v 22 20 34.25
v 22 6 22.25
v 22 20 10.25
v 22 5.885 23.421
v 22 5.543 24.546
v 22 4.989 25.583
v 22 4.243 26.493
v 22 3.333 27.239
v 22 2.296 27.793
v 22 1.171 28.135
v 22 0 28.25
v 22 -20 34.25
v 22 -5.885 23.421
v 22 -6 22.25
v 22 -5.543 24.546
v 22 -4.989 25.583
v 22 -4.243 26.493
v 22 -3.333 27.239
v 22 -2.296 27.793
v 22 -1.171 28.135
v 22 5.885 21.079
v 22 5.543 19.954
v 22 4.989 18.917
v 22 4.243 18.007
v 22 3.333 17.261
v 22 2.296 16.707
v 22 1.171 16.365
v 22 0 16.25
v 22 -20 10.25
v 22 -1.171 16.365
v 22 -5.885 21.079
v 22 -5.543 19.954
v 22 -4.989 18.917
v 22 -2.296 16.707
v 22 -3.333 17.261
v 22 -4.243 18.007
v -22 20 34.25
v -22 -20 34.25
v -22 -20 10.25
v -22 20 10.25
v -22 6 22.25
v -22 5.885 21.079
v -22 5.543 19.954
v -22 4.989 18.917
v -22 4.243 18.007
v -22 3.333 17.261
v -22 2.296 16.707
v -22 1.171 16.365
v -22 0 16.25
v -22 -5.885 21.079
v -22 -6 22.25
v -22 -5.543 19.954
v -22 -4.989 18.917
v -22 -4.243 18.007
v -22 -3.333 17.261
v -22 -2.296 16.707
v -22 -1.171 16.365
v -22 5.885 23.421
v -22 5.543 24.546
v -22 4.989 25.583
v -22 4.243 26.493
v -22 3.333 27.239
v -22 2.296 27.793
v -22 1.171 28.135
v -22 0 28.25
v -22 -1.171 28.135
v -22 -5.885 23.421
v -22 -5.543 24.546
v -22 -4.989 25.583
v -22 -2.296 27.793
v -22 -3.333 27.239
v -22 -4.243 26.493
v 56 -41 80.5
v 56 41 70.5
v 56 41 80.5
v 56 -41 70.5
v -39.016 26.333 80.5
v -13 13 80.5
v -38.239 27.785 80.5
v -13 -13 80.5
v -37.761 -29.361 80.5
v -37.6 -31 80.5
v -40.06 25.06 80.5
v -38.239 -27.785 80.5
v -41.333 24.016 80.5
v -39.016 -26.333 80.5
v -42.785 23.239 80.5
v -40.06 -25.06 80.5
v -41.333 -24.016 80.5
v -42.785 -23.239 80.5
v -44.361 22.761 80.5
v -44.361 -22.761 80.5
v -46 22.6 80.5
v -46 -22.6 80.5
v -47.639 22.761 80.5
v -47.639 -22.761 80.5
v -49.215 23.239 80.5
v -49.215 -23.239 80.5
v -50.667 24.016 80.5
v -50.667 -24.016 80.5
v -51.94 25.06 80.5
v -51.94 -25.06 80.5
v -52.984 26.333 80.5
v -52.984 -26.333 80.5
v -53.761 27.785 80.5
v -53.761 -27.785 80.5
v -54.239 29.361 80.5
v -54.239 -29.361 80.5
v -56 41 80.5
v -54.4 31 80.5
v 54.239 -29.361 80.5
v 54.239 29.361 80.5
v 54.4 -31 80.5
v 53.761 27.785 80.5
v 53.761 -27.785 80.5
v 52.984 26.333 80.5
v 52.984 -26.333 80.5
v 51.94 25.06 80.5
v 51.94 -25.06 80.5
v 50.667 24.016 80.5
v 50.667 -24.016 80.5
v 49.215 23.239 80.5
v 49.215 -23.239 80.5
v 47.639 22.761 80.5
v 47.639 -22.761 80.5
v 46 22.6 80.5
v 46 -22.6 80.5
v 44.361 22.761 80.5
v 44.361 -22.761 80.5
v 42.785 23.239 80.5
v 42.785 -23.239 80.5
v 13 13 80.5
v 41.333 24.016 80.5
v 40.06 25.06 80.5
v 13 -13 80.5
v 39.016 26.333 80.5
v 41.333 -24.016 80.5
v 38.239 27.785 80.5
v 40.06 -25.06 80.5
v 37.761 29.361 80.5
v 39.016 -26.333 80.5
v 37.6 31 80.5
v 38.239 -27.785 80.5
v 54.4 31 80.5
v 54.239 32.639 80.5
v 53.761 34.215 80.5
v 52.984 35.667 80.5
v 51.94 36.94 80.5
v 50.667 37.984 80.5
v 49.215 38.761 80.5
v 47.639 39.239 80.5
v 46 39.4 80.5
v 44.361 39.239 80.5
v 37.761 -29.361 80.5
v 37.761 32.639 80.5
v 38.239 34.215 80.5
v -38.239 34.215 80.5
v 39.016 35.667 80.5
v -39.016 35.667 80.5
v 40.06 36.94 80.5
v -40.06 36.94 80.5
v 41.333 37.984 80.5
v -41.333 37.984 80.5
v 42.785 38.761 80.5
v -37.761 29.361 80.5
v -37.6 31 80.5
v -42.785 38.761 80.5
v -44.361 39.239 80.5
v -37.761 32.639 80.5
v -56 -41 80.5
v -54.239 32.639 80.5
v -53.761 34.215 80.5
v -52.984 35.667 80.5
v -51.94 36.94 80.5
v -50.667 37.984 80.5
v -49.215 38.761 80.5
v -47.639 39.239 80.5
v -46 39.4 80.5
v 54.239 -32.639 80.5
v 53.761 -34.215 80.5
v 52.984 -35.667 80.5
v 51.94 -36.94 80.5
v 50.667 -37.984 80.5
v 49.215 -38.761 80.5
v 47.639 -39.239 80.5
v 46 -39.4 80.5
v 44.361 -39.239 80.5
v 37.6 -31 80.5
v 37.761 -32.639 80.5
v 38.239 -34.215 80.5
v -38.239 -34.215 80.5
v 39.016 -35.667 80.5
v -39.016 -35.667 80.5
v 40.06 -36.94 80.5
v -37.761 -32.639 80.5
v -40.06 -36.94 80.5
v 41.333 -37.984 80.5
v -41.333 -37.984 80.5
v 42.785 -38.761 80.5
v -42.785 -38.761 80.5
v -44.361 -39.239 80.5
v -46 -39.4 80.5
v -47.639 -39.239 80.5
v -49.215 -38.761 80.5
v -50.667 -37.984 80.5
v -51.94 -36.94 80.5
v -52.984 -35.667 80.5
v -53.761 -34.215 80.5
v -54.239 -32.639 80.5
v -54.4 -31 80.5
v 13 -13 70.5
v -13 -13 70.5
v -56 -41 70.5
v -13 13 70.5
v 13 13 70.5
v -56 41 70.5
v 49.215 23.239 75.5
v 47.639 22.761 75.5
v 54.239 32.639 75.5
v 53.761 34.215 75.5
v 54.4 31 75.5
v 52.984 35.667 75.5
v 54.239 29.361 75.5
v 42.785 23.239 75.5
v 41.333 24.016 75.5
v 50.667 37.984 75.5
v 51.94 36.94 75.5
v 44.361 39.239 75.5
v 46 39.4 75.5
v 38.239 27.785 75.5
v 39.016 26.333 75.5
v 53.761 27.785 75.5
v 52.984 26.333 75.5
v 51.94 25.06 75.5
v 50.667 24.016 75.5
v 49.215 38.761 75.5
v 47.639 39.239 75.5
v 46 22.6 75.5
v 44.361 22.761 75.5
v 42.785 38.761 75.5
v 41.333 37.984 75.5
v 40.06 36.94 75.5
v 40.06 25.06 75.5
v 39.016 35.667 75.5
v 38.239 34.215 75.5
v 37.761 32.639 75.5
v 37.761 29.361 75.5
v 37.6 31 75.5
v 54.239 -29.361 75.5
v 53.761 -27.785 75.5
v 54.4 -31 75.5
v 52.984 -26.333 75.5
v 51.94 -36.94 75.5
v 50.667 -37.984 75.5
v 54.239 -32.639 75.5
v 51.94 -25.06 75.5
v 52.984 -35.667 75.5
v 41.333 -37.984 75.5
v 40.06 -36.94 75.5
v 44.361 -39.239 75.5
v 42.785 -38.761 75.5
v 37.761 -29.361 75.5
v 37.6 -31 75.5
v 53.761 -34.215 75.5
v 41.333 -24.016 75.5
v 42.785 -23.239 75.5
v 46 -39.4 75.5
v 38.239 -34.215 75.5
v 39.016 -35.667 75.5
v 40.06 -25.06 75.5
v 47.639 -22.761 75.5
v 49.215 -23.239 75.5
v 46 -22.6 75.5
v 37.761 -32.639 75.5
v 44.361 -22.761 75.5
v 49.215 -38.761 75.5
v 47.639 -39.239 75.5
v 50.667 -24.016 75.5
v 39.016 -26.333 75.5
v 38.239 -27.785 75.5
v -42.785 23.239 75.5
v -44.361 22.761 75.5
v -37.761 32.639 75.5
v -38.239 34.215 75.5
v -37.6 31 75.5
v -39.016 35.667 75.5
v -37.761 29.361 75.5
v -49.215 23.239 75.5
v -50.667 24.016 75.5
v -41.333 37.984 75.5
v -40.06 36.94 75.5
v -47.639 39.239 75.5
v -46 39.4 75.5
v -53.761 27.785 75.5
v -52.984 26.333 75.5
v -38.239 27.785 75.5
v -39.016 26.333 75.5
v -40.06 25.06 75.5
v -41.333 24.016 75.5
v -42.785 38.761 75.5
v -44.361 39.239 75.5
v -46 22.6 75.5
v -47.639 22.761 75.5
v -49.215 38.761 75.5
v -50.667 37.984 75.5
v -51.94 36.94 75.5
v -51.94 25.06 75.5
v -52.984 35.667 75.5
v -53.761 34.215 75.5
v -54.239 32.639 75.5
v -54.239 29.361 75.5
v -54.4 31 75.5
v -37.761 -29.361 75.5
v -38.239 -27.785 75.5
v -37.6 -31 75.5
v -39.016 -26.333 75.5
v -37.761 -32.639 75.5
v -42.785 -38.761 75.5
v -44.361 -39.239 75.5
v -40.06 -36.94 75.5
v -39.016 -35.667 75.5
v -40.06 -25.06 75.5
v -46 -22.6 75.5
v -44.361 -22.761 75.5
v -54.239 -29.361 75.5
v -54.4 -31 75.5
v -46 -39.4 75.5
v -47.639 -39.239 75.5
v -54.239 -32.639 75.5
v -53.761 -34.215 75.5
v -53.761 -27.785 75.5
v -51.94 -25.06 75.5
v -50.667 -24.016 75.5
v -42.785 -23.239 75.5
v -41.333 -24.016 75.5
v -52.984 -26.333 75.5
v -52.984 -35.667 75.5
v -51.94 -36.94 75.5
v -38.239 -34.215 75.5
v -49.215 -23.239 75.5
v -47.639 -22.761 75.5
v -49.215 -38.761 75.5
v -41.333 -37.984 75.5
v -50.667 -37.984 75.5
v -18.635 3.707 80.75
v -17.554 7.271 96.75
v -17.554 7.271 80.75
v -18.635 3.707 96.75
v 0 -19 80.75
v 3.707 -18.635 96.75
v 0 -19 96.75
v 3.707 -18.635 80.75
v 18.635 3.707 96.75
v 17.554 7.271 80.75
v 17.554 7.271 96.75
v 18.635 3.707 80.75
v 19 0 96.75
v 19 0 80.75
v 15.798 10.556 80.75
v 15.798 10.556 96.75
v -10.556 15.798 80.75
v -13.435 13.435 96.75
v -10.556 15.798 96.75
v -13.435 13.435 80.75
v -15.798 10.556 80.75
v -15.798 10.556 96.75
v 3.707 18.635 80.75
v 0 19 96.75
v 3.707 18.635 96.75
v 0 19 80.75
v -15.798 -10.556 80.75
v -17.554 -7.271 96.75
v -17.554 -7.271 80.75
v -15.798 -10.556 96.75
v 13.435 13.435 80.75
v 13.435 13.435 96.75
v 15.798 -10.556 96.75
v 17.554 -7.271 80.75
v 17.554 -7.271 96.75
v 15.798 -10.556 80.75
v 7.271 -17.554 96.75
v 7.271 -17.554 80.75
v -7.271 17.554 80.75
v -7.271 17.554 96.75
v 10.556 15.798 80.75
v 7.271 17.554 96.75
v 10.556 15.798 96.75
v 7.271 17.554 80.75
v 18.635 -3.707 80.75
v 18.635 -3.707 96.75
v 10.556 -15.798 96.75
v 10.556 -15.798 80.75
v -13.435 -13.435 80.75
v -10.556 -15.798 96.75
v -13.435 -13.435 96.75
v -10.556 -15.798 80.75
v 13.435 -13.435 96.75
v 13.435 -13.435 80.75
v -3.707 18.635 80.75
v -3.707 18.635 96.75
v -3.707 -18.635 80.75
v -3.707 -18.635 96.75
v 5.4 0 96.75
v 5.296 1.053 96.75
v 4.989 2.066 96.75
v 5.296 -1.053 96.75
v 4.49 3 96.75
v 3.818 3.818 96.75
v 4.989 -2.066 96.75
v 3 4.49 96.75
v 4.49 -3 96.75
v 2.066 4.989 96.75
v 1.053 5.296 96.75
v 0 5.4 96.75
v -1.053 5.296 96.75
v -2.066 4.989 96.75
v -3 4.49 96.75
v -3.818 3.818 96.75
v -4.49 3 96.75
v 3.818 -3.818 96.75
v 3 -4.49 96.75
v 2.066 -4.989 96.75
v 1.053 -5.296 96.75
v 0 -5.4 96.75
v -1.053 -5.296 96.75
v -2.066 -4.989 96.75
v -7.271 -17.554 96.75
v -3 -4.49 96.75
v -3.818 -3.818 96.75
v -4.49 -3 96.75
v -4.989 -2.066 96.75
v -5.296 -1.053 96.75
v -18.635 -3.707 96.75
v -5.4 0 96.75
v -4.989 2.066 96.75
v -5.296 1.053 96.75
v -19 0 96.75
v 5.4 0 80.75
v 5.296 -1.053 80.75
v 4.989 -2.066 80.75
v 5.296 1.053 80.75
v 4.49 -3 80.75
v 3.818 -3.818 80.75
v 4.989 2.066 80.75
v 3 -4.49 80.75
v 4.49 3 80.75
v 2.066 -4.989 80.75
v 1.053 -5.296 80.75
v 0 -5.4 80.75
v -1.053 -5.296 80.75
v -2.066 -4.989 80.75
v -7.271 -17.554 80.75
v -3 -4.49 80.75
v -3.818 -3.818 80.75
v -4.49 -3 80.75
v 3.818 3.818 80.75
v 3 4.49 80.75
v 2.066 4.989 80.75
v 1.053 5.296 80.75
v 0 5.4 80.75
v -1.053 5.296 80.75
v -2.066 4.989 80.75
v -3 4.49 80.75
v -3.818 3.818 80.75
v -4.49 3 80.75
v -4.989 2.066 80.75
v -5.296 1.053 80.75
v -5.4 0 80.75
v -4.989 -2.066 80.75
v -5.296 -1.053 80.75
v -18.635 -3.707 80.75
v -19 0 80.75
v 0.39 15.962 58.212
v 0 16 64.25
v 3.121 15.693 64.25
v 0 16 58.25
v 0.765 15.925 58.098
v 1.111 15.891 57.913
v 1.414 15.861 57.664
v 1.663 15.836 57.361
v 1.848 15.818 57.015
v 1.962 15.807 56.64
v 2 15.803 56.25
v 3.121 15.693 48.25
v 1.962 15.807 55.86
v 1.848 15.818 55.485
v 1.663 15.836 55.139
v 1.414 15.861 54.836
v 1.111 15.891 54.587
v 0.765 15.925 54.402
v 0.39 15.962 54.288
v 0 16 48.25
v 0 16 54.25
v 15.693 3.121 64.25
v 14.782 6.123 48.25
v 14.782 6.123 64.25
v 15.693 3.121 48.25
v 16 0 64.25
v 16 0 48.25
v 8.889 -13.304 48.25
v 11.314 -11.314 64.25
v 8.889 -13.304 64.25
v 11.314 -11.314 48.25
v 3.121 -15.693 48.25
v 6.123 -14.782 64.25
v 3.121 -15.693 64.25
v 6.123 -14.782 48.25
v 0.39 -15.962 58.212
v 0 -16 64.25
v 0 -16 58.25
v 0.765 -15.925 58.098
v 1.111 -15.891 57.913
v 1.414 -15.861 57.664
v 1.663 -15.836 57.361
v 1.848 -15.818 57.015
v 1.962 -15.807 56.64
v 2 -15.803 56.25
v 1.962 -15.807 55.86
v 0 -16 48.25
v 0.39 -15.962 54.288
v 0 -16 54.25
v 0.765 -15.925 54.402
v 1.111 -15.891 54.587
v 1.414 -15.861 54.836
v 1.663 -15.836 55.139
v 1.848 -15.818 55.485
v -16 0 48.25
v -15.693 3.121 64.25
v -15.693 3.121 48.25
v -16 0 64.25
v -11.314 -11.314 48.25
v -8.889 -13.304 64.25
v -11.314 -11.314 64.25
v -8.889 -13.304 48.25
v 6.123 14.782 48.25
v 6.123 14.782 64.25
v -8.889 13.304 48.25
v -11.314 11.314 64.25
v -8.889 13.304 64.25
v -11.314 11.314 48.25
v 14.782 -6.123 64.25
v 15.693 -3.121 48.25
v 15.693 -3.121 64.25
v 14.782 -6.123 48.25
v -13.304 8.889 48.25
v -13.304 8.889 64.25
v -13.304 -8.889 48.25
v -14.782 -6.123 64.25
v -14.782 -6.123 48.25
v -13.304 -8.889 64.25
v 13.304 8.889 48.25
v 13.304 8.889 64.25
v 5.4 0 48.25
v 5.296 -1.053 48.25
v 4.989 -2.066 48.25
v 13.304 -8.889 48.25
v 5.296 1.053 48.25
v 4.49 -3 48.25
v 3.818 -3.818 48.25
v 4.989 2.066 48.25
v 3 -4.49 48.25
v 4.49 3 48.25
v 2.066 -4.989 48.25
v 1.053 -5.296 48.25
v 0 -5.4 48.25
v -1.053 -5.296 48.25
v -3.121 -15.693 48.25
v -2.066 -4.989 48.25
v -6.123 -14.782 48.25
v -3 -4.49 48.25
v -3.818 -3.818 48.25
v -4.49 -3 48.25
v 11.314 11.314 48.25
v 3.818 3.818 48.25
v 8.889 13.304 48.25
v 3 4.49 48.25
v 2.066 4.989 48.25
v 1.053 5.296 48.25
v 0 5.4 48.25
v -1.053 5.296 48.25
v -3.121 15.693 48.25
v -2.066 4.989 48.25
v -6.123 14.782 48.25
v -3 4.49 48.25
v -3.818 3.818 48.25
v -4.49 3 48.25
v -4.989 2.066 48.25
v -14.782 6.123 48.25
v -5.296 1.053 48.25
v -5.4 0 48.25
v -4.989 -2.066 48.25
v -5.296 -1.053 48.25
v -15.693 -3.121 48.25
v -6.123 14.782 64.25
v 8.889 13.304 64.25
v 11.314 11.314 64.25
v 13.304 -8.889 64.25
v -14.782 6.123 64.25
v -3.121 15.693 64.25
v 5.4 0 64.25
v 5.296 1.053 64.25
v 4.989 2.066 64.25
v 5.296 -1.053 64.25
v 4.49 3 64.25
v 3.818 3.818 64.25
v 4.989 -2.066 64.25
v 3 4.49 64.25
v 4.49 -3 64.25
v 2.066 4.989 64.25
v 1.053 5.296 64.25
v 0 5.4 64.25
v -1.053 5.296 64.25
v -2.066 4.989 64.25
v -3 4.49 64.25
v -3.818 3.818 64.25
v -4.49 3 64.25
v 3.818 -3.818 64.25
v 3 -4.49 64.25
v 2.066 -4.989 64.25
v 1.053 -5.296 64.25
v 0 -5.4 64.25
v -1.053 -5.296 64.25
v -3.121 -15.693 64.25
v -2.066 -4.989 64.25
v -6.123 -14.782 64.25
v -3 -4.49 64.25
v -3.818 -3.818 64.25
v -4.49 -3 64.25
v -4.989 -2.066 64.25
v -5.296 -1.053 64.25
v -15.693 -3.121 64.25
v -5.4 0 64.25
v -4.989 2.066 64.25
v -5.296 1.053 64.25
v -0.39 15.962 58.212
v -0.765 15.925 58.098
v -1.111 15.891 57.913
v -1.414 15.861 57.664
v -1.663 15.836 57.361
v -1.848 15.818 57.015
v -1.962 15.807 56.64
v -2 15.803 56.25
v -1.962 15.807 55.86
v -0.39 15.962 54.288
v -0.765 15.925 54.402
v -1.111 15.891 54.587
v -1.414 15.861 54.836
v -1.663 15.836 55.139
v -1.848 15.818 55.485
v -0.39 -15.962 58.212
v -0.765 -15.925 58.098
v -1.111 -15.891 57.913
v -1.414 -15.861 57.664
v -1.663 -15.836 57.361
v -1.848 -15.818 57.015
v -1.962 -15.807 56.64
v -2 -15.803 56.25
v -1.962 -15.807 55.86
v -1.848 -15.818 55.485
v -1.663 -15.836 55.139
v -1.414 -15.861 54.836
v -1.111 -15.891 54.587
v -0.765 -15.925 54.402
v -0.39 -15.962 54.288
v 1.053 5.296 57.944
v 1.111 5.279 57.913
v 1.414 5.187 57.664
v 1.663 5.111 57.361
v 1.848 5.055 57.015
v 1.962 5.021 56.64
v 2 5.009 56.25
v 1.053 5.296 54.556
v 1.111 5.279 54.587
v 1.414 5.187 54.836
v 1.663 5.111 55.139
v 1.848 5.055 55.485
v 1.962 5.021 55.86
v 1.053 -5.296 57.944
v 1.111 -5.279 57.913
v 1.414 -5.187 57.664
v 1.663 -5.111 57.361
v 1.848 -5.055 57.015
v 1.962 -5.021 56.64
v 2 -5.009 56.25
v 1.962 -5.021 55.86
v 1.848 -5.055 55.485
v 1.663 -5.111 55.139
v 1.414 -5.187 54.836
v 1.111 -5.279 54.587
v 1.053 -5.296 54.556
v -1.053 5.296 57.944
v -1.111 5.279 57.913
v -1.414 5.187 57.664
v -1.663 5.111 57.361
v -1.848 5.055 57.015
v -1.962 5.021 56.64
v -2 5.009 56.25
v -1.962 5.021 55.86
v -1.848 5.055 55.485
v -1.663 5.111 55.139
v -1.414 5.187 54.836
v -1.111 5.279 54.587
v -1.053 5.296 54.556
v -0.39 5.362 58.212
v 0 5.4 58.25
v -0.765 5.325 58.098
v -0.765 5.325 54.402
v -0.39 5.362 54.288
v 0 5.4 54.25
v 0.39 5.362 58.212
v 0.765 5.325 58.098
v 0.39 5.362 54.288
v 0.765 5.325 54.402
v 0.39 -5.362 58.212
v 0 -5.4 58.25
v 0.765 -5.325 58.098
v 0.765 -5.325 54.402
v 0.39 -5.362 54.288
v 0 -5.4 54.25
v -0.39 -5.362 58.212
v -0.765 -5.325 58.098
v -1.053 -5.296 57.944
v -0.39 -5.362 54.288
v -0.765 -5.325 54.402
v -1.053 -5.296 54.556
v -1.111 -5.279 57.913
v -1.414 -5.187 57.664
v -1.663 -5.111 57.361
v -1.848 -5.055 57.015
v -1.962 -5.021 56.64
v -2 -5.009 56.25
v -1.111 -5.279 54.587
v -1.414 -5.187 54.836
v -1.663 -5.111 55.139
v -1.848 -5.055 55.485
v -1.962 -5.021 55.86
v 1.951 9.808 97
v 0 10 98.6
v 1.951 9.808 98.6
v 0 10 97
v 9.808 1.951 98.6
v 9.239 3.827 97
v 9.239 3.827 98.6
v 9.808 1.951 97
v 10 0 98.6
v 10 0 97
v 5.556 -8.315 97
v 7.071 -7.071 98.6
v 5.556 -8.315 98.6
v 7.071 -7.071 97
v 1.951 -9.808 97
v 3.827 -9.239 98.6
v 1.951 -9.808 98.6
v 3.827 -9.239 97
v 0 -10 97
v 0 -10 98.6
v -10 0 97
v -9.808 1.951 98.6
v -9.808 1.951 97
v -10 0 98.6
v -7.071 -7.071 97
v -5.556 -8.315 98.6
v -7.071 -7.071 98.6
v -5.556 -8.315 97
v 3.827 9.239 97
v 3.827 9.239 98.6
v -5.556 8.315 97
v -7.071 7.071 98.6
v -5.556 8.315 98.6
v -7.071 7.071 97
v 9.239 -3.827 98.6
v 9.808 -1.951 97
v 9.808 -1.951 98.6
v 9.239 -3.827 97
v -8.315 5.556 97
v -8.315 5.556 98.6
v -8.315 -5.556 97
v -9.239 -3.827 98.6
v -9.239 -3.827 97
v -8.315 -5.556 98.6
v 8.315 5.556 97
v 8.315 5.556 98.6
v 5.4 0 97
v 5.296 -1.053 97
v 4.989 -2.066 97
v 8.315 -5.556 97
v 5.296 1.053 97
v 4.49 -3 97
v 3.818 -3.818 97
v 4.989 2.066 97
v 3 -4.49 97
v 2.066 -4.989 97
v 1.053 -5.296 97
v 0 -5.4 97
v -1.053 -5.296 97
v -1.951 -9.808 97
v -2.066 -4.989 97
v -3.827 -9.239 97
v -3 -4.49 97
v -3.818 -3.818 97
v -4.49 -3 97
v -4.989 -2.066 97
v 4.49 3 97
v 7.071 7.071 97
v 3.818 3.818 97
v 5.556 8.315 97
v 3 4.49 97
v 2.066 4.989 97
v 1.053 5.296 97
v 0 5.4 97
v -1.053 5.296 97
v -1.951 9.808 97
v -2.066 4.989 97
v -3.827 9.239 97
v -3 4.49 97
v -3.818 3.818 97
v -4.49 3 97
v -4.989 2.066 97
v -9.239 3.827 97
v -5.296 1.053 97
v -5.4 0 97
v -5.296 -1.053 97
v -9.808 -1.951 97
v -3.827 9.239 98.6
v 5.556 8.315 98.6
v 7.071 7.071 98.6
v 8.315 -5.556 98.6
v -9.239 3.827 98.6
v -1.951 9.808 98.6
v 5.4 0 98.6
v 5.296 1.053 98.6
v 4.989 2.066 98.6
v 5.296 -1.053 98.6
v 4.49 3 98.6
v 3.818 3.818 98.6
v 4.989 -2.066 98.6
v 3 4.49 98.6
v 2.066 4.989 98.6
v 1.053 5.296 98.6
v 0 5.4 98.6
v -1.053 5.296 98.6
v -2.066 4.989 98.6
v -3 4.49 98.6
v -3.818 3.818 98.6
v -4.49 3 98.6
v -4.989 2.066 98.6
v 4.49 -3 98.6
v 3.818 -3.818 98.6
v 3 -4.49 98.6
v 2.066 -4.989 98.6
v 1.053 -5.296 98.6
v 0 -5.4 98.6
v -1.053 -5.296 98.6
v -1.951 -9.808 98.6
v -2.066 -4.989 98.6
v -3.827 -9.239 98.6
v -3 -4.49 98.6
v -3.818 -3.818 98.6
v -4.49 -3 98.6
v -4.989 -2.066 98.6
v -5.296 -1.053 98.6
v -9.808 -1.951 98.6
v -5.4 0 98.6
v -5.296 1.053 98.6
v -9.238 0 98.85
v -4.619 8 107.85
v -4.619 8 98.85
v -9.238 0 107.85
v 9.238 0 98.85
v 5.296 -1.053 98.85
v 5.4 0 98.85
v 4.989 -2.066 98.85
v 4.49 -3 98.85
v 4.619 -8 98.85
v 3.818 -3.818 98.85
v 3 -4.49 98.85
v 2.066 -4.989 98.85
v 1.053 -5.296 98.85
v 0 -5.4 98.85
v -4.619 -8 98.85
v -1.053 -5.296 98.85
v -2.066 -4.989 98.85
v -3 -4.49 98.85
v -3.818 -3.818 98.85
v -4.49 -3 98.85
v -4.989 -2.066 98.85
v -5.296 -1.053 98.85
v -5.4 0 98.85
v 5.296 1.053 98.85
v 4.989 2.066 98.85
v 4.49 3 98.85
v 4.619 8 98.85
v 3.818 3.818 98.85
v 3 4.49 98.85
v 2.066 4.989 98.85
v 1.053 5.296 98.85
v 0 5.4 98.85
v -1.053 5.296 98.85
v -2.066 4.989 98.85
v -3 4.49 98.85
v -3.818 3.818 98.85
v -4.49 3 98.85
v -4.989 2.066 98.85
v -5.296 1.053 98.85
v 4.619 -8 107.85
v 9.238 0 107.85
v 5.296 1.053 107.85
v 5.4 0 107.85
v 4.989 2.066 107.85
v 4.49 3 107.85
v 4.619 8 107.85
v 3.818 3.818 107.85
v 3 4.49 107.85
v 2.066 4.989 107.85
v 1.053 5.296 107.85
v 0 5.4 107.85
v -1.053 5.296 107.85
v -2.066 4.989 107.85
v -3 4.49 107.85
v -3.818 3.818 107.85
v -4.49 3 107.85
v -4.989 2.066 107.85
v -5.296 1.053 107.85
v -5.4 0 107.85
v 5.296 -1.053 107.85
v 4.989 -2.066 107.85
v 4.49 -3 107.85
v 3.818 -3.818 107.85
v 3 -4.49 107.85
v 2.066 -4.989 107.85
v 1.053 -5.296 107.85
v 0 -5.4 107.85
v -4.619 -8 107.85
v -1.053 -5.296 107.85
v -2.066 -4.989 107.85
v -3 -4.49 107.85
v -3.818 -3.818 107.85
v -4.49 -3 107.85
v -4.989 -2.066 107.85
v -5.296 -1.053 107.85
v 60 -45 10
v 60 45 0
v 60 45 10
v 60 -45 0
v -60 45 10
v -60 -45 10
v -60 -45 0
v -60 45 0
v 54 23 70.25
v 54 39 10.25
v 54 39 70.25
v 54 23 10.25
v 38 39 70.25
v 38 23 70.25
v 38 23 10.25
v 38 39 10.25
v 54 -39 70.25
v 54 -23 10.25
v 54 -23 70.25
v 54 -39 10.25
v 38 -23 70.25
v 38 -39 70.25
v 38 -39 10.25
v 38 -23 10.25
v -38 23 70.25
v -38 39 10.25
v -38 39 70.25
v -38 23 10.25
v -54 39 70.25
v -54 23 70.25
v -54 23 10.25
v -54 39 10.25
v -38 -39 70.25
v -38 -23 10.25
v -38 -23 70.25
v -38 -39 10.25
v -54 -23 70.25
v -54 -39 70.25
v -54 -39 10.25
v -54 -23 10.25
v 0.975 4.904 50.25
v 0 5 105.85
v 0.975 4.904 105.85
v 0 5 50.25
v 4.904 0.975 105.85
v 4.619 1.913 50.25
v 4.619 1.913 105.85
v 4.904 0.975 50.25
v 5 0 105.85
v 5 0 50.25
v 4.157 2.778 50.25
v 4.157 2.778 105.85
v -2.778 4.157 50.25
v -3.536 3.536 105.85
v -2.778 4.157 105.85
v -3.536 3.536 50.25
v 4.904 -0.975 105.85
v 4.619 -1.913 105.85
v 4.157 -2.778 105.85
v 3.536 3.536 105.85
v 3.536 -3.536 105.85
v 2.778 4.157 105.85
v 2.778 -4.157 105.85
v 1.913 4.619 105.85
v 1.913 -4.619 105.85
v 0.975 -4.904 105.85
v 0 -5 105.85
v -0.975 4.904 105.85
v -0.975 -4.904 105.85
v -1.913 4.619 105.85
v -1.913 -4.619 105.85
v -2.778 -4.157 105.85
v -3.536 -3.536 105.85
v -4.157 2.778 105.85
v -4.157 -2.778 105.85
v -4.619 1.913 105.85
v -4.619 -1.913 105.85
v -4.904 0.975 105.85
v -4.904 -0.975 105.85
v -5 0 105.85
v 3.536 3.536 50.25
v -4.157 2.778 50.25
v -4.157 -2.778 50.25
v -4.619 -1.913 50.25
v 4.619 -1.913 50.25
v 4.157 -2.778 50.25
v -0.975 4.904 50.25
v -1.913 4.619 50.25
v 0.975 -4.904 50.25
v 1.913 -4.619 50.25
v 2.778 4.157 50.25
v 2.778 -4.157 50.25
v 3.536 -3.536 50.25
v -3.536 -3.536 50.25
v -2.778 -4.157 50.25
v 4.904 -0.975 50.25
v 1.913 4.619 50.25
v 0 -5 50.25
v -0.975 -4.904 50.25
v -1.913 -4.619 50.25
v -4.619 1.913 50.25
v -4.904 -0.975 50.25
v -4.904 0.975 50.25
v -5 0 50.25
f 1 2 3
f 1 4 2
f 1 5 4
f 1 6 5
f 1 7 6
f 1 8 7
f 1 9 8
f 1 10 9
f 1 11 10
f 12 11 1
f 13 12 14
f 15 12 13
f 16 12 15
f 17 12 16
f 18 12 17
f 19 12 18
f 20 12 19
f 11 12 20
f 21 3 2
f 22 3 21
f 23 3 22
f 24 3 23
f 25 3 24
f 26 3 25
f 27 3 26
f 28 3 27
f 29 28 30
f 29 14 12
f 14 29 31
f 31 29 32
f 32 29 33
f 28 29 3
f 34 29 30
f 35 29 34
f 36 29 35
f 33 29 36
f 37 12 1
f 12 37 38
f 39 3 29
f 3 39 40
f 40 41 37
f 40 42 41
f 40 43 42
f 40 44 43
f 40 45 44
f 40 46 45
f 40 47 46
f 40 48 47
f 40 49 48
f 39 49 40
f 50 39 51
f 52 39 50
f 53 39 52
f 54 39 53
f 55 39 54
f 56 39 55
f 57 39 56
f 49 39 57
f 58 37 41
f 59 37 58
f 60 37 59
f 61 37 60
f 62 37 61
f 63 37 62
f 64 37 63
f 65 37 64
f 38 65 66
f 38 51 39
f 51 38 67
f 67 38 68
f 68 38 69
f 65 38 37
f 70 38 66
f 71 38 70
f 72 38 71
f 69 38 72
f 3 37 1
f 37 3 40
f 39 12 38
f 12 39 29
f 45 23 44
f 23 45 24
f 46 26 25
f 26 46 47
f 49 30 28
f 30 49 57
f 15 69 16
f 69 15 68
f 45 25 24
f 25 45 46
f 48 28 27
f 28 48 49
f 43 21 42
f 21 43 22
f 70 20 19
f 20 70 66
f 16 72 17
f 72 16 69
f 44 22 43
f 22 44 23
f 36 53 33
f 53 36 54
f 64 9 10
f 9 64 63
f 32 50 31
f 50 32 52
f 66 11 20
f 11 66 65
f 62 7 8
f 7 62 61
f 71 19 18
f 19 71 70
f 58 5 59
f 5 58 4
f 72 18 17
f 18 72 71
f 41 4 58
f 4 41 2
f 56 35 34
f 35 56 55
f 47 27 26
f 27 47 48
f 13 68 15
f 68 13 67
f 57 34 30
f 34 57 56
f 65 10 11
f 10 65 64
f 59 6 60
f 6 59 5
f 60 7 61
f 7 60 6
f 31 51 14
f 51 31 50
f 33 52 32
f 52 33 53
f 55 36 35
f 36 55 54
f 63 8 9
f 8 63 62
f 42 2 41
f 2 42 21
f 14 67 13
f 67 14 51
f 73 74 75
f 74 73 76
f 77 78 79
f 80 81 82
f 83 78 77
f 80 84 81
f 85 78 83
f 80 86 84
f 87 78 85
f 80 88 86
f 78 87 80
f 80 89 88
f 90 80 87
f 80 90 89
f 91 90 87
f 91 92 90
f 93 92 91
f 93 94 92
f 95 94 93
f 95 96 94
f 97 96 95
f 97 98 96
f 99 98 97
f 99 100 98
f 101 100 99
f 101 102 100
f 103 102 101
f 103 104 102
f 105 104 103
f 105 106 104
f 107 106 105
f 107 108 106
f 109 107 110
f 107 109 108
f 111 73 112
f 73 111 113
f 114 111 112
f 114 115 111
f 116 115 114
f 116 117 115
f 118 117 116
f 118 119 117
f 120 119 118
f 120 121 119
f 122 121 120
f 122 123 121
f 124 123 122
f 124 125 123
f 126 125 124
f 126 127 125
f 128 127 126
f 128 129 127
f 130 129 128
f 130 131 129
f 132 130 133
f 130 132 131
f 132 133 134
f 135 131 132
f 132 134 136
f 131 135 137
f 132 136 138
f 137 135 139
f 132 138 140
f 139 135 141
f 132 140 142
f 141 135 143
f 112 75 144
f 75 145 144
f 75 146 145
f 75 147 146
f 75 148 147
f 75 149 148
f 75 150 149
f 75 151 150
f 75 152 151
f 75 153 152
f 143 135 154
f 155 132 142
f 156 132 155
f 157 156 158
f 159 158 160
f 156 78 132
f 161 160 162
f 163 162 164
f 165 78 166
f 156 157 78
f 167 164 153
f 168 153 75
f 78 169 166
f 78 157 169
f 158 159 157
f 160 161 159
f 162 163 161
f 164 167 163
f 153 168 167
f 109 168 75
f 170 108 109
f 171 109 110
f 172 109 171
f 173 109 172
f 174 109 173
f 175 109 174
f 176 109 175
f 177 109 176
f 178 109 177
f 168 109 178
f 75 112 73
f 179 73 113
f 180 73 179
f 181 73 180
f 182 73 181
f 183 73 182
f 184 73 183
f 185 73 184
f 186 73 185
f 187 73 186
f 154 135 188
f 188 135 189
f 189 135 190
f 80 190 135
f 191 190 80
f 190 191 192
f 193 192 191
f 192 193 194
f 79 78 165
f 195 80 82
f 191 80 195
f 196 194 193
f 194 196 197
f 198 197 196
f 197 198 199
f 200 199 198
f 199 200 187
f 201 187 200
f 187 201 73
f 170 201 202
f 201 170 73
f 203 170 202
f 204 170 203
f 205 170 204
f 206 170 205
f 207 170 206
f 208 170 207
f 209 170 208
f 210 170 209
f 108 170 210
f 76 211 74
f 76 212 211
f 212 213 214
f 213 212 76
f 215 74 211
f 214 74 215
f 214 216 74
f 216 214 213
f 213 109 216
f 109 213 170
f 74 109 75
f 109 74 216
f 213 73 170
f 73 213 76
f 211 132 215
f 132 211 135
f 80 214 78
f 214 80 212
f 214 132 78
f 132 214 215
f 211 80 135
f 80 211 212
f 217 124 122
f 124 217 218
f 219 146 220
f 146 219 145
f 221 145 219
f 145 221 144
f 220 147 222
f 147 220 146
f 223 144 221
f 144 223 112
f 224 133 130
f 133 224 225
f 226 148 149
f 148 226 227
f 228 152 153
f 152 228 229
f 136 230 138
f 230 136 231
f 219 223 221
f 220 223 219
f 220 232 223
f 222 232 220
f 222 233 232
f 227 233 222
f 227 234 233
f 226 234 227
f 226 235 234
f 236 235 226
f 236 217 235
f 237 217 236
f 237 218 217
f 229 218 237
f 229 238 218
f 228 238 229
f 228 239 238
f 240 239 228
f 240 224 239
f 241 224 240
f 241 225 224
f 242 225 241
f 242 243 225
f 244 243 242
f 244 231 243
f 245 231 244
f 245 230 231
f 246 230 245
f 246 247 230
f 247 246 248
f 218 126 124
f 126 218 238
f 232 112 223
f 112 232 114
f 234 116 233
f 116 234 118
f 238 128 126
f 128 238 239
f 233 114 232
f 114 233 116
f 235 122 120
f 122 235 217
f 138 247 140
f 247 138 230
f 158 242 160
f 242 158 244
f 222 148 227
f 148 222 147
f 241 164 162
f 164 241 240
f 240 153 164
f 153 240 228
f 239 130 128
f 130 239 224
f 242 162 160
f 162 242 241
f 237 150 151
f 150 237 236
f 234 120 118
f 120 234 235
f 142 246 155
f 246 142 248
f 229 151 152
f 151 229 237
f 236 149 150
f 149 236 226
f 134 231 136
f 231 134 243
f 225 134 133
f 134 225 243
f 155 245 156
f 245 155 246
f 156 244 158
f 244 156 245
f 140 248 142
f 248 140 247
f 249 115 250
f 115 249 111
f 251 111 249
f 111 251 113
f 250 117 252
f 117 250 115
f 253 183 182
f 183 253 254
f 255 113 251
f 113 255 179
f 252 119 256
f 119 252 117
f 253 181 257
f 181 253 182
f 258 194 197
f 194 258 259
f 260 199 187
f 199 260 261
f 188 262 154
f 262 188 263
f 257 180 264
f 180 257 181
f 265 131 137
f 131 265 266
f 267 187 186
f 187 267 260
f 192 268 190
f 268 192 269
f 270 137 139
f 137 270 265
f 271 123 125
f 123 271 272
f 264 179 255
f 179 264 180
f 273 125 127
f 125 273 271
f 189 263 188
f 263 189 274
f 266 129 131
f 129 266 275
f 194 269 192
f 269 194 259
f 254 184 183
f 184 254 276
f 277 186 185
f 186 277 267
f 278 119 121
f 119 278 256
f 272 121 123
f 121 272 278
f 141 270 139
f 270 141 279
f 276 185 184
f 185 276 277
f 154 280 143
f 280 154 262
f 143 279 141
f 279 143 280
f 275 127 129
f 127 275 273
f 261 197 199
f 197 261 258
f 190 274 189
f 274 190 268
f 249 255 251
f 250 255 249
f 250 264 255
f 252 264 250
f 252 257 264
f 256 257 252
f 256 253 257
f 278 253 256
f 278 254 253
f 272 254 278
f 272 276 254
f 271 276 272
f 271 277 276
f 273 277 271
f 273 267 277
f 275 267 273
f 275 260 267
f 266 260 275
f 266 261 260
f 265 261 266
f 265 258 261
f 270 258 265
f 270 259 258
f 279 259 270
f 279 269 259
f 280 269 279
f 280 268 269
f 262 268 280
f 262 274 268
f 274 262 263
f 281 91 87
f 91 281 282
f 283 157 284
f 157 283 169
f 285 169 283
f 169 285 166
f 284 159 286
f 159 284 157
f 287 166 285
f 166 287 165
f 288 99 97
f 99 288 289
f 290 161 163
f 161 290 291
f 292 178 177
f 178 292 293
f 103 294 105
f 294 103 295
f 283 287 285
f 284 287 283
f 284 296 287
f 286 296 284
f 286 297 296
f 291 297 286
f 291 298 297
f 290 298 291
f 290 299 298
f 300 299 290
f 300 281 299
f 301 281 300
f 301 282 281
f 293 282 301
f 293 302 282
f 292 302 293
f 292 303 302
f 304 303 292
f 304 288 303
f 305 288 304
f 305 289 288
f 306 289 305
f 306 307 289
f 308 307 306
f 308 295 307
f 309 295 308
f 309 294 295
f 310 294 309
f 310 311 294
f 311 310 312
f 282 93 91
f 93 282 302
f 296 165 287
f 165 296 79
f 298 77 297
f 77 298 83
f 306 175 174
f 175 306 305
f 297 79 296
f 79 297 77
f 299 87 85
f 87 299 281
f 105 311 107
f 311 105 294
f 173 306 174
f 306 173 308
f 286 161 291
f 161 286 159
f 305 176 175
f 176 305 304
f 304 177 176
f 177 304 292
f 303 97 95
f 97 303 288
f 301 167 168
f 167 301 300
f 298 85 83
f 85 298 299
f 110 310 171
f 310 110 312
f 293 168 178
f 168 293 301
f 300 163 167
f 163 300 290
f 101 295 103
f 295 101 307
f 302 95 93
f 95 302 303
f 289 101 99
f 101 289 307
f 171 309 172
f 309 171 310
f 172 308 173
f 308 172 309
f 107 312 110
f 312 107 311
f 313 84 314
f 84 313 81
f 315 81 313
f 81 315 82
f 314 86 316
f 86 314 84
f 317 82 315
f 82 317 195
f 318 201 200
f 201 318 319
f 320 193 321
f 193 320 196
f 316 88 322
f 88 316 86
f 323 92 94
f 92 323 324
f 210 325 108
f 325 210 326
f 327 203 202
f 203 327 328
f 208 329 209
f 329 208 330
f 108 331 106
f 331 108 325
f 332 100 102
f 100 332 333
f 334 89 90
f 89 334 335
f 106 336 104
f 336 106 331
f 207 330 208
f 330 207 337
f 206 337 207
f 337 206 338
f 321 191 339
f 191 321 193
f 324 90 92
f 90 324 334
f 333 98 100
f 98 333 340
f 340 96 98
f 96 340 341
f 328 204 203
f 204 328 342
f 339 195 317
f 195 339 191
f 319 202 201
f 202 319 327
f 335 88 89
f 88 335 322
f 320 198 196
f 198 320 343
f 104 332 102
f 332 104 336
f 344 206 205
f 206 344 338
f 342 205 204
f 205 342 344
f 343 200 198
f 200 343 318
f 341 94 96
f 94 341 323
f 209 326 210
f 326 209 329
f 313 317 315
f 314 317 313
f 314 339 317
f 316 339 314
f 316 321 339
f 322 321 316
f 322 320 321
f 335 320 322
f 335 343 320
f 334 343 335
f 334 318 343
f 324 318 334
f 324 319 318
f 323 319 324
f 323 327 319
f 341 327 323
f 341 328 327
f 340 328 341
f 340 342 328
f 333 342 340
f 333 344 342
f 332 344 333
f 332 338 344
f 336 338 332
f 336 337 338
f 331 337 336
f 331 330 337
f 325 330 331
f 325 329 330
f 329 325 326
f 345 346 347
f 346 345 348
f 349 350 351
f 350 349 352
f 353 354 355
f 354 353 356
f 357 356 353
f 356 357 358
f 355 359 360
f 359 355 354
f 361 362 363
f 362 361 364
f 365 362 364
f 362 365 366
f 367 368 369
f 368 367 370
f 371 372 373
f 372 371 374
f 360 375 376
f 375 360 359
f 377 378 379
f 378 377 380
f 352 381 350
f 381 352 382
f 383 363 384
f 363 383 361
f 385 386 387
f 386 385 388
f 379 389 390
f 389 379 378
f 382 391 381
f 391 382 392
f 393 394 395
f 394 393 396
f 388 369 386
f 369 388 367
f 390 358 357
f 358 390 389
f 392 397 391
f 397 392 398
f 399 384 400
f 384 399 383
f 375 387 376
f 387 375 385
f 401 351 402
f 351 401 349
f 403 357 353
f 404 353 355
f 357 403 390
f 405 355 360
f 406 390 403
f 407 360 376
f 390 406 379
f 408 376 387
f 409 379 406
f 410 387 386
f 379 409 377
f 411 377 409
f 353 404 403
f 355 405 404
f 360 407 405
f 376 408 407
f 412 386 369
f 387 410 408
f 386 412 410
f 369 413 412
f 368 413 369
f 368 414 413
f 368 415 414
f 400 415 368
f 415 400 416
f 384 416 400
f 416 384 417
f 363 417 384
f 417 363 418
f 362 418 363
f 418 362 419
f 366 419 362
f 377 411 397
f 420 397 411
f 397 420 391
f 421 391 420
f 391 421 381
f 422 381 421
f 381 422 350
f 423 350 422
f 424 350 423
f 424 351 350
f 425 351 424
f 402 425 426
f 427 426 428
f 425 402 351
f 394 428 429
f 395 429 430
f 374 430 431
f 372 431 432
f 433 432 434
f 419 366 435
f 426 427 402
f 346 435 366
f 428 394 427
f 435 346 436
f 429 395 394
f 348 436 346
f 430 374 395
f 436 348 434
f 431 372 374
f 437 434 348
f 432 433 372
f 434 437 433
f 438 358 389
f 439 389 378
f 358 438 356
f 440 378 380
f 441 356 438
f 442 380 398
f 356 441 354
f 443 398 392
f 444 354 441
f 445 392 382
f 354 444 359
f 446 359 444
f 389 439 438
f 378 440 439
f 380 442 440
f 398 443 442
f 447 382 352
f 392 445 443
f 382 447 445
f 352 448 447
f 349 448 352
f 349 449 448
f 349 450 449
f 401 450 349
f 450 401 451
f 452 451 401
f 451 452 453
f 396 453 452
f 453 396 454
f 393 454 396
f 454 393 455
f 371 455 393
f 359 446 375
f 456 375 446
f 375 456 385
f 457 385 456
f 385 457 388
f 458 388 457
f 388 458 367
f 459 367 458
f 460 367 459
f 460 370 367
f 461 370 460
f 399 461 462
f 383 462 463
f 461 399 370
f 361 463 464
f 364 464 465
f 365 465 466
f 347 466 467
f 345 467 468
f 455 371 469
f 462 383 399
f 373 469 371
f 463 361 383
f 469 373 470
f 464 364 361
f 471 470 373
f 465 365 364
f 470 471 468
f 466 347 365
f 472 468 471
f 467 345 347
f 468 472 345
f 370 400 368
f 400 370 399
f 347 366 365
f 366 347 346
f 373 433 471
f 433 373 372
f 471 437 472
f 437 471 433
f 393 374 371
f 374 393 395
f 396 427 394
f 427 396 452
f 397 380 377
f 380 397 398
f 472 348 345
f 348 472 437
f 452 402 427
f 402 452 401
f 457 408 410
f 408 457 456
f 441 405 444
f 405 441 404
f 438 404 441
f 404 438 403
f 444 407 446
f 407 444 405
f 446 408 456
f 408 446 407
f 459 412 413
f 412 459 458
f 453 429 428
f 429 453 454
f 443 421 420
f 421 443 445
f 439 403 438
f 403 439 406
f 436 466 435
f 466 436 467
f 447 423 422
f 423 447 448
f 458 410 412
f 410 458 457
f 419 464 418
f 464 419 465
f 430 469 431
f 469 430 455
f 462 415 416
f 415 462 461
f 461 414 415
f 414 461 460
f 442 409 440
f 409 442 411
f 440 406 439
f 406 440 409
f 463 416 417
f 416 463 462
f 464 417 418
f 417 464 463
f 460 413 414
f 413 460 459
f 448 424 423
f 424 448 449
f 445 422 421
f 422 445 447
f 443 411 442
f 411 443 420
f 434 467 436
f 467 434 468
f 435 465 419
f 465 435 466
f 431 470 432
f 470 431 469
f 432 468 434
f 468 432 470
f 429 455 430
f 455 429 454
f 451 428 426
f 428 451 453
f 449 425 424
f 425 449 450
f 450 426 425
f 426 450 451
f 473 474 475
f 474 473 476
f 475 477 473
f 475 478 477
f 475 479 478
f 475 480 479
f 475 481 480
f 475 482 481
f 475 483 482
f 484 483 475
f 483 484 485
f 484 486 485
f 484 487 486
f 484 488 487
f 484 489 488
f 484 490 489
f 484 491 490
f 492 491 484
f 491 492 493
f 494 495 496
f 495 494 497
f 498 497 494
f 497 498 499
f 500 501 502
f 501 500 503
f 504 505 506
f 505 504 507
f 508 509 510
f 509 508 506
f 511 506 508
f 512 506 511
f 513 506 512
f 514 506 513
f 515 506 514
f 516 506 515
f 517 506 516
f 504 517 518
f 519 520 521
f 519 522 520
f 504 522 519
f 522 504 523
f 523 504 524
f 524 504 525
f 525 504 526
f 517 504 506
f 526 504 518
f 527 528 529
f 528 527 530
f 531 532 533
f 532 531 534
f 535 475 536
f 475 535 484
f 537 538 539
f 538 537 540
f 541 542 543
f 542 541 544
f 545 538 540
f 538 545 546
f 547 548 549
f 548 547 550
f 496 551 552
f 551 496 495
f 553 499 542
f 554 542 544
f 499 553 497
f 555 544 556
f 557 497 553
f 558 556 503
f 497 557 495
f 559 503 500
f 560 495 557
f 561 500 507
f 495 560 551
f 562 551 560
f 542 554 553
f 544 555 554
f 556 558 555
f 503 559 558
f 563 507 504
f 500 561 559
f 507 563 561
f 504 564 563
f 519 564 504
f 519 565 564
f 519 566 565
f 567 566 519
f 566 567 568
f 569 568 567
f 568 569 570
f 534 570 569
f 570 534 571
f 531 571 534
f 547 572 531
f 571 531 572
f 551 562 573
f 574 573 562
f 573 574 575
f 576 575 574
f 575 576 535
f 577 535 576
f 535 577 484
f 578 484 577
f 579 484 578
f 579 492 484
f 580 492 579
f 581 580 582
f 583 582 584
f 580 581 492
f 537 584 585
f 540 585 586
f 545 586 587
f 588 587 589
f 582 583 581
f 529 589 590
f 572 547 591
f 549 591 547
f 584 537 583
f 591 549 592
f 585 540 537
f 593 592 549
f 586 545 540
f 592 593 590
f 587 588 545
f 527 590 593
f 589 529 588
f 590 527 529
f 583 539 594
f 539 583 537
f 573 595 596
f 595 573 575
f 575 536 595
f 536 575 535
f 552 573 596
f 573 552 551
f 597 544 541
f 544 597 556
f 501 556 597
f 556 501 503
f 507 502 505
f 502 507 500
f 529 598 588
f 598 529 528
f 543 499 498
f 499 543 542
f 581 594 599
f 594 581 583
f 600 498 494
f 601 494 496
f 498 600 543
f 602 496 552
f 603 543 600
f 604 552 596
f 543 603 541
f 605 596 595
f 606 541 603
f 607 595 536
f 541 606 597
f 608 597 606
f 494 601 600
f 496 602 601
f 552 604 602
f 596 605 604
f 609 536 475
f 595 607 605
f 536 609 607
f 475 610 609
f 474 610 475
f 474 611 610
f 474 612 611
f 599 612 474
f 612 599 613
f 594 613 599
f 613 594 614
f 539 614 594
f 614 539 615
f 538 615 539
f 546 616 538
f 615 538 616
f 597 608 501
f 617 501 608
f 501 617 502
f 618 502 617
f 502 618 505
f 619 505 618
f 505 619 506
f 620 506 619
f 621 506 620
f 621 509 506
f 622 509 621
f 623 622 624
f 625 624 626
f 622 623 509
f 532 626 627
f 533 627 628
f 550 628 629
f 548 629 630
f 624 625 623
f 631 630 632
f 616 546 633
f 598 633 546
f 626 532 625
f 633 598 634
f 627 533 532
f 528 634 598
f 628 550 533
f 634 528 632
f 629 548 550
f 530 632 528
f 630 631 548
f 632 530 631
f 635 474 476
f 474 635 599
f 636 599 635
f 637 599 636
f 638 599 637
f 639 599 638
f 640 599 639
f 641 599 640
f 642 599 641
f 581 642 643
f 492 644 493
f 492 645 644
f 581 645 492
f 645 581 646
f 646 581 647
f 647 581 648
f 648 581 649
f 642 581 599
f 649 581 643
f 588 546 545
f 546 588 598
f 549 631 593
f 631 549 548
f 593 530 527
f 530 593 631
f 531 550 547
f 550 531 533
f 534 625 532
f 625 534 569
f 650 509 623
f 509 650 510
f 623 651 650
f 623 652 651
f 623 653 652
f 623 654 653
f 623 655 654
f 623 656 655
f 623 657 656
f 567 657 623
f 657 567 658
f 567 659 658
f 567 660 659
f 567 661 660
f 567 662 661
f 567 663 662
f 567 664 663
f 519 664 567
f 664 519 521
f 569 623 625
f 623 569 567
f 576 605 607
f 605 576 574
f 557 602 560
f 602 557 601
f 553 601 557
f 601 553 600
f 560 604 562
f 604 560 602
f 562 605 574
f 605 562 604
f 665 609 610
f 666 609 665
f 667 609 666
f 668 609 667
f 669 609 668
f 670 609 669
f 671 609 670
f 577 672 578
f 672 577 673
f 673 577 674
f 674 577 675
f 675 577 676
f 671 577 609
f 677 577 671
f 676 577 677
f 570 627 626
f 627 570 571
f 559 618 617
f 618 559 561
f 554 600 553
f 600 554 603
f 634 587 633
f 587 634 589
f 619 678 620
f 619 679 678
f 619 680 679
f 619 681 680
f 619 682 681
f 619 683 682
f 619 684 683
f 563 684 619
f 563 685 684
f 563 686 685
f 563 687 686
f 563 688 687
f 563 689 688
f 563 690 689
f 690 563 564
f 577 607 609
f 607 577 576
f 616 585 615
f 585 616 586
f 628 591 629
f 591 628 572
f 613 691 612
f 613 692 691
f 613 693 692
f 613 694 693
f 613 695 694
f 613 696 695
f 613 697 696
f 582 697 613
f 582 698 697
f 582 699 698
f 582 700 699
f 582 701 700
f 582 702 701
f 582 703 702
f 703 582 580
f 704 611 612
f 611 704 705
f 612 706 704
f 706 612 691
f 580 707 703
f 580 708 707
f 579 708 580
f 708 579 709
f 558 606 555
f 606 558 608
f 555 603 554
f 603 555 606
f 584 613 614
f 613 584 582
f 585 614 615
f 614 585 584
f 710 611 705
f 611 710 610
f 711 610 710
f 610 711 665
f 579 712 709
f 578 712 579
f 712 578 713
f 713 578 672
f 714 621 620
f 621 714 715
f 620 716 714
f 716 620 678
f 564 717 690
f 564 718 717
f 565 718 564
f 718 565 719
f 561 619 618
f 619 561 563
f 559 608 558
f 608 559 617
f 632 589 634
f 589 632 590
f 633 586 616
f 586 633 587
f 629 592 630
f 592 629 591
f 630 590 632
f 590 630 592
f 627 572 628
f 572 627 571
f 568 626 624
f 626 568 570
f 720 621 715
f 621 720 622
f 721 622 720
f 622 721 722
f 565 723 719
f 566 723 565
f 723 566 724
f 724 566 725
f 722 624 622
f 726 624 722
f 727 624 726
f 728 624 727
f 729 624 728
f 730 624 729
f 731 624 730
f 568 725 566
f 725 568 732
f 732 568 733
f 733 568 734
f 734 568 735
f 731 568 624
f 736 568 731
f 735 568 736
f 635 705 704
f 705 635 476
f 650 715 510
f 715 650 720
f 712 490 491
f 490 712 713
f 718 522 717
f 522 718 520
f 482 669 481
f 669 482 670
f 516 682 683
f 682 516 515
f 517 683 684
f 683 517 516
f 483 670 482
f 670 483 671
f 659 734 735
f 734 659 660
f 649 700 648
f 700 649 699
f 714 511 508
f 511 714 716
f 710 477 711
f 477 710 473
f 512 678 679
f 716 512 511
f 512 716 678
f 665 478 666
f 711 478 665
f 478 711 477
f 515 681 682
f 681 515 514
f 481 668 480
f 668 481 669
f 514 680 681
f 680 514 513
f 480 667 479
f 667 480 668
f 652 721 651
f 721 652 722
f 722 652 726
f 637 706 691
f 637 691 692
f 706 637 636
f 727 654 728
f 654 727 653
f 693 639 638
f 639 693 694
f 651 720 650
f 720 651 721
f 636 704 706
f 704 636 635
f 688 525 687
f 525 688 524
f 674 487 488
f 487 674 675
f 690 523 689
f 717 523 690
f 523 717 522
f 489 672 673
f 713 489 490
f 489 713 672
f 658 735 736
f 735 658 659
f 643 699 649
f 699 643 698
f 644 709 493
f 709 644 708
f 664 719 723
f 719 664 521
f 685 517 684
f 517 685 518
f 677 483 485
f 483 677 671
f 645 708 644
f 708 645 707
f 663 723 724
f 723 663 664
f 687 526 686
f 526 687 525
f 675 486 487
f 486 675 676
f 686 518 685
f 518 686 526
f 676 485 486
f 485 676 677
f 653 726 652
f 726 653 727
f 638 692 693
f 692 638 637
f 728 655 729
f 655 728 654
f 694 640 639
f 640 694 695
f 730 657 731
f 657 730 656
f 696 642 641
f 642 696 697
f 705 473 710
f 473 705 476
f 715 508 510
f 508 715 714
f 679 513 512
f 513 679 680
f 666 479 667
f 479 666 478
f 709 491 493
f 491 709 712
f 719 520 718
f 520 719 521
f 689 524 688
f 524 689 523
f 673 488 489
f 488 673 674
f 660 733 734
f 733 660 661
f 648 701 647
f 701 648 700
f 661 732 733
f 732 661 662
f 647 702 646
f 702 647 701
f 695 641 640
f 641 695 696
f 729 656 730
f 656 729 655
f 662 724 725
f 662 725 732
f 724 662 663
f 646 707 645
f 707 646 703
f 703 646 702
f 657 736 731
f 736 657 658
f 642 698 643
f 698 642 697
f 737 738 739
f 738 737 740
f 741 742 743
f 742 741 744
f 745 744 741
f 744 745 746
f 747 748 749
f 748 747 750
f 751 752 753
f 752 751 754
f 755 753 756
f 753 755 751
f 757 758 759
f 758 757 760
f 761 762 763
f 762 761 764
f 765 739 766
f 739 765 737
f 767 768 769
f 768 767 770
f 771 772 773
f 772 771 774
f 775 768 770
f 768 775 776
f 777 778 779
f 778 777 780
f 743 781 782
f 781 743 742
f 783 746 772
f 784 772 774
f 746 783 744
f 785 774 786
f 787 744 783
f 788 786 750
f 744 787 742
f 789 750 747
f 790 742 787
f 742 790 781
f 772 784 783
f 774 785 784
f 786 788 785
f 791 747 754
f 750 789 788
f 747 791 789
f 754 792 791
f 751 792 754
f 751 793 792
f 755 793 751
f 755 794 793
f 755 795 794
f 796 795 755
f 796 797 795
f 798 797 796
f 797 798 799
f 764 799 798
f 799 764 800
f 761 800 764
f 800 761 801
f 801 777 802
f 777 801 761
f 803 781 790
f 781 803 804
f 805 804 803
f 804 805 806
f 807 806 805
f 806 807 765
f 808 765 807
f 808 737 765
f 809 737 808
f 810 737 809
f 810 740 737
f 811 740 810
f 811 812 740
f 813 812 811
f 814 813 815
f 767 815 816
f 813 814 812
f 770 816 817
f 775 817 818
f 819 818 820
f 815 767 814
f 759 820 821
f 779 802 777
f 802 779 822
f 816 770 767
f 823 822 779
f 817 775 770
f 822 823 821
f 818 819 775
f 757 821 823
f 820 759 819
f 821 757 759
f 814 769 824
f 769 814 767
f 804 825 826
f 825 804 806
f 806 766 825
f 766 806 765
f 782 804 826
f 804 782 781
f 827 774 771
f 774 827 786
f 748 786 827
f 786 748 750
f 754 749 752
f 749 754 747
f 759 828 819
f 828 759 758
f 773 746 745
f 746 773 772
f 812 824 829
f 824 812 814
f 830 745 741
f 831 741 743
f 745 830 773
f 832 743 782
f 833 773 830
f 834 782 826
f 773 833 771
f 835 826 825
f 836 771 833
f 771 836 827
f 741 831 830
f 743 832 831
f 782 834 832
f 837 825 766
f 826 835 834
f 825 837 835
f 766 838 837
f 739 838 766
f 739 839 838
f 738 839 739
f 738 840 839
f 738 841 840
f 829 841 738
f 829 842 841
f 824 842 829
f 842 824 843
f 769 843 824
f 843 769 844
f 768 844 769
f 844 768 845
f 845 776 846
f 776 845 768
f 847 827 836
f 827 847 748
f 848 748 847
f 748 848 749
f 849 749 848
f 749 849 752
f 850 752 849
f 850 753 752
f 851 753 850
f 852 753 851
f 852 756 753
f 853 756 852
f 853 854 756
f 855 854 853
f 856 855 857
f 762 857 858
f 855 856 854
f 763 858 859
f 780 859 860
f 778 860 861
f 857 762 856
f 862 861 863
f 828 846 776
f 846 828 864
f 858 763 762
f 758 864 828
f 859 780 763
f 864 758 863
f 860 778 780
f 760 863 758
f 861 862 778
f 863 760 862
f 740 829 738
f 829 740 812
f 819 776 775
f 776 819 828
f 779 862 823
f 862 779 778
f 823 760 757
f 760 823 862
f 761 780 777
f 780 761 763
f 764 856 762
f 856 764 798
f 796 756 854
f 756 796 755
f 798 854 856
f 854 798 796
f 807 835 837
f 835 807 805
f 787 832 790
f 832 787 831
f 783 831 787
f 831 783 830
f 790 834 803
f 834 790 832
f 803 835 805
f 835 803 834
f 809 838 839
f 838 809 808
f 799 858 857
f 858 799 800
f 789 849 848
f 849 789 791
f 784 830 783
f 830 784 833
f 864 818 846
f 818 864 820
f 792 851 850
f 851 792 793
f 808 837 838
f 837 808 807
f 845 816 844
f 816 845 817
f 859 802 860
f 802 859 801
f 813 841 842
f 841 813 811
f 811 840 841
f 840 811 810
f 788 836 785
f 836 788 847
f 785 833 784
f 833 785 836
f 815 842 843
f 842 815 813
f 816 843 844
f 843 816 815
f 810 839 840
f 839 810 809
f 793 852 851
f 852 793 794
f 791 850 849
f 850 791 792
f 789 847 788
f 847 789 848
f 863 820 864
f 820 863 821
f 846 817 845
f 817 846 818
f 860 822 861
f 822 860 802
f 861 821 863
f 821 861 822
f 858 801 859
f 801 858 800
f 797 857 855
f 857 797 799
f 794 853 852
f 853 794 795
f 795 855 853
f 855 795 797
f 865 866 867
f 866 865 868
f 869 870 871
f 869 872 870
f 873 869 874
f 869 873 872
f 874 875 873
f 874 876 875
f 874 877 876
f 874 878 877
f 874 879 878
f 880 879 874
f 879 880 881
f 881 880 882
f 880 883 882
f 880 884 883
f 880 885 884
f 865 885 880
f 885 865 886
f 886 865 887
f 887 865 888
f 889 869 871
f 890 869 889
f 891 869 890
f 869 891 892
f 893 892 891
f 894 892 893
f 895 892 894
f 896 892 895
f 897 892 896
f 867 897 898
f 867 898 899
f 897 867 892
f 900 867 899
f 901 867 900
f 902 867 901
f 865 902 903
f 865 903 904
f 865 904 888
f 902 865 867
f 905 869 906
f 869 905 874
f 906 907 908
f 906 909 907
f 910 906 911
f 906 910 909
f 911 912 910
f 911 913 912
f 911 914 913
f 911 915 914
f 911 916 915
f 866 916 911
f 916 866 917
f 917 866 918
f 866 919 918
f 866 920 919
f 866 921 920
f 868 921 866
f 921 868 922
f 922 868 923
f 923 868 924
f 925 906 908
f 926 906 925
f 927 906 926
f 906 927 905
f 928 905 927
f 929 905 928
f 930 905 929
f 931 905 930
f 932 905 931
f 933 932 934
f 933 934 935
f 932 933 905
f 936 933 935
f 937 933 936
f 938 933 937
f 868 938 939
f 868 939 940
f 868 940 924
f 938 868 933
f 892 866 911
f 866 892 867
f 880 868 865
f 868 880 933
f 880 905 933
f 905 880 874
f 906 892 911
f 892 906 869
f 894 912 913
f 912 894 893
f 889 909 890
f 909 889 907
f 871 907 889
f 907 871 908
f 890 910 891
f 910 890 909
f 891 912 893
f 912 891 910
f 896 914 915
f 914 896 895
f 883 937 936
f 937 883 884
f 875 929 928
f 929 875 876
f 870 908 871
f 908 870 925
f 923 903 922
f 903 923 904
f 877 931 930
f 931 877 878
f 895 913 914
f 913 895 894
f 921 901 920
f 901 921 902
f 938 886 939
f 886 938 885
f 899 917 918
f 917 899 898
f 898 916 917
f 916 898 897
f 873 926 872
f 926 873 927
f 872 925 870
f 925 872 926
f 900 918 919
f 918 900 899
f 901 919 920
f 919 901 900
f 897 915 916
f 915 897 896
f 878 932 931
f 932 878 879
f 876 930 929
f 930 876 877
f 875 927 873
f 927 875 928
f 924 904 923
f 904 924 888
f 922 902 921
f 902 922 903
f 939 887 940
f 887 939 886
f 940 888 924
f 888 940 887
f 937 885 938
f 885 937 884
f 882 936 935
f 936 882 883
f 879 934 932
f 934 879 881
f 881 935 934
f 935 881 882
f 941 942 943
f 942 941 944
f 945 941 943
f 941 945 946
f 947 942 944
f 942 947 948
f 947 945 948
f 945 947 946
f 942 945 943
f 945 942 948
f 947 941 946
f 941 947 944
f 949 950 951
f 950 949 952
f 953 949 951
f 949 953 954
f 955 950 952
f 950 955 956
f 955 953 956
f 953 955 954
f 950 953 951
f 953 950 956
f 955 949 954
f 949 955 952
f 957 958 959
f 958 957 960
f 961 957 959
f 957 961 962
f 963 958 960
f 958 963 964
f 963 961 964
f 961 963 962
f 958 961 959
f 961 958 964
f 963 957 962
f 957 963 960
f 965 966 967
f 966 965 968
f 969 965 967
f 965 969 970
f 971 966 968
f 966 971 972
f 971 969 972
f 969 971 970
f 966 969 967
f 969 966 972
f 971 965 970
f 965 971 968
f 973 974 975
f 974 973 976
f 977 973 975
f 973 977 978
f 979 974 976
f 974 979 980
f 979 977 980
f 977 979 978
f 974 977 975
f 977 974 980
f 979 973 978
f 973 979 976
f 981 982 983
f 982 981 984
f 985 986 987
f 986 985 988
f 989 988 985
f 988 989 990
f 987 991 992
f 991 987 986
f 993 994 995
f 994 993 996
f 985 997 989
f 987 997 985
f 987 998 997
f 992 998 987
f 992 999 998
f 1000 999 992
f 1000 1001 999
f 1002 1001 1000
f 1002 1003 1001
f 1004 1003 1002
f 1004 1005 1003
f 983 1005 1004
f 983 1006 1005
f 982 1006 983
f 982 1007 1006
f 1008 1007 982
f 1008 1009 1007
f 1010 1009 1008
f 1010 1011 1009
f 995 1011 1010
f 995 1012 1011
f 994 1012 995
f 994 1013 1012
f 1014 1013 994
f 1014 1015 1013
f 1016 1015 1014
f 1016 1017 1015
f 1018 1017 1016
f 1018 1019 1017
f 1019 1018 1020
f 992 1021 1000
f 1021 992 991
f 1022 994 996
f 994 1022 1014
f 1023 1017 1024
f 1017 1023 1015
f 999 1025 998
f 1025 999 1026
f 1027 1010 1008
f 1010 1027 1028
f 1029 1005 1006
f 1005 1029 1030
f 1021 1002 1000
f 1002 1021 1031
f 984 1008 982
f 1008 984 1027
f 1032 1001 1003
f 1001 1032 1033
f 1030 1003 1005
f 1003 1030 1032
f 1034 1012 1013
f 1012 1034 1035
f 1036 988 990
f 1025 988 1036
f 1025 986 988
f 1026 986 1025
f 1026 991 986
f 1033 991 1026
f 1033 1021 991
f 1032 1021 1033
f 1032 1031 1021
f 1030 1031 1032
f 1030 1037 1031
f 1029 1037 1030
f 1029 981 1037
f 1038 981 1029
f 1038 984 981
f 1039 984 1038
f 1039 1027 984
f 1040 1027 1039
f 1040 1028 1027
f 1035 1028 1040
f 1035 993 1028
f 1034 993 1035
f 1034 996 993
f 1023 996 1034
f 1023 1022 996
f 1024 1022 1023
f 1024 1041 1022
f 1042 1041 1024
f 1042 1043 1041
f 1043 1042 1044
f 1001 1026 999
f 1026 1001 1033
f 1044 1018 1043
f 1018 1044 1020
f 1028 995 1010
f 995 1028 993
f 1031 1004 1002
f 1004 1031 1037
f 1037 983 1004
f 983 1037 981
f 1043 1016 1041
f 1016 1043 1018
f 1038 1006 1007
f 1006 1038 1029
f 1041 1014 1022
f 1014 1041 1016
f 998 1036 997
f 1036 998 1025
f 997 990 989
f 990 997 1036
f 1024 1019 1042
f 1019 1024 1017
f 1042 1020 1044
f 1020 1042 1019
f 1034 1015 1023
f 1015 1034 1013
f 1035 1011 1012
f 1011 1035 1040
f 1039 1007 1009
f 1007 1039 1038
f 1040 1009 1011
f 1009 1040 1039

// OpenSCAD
$fn = 32;

// ------------------------------------------------------------------------
// Arbor press fixture: screw d10, posts 60 mm, gap 14 mm
// Every part is its own module, assembly() places every instance.
// ------------------------------------------------------------------------

// --- part 1 ---
module press_bed() {
  difference() {
    translate([-60, -45, 0]) cube([120, 90, 10]);
  }
}

// --- part 2 ---
module anvil_block() {
  difference() {
    translate([-22, -20, 0]) cube([44, 40, 24]);
    translate([0, 0, 12]) rotate([0, 90, 0]) cylinder(h = 46, d = 12, center = true);
  }
}

// --- part 3 ---
module press_post_a() {
  translate([-8, -8, 0]) cube([16, 16, 60]);
}

// --- part 4 ---
module press_post_b() {
  translate([-8, -8, 0]) cube([16, 16, 60]);
}

// --- part 5 ---
module press_post_c() {
  translate([-8, -8, 0]) cube([16, 16, 60]);
}

// --- part 6 ---
module press_post_d() {
  translate([-8, -8, 0]) cube([16, 16, 60]);
}

// --- part 7 ---
module press_frame() {
  difference() {
    translate([-56, -41, 0]) cube([112, 82, 10]);
    translate([-13, -13, -1]) cube([26, 26, 12]);
    translate([46, 31, 5]) cylinder(h = 6, d = 16.8);
    translate([46, -31, 5]) cylinder(h = 6, d = 16.8);
    translate([-46, 31, 5]) cylinder(h = 6, d = 16.8);
    translate([-46, -31, 5]) cylinder(h = 6, d = 16.8);
  }
}

// --- part 8 ---
module guide_ring() {
  difference() {
      translate([0, 0, 0]) cylinder(h = 16, d = 38);
      translate([0, 0, -1]) cylinder(h = 18, d = 10.8);
    }
}

// --- part 9 ---
module press_screw() {
  translate([0, 0, -27.8]) cylinder(h = 55.6, d = 10);
}

// --- part 10 ---
module press_head() {
  difference() {
    cylinder(h = 16, d = 32);
    translate([0, 0, -1]) cylinder(h = 18, d = 10.8);
    translate([0, 0, 8]) rotate([90, 0, 0]) cylinder(h = 34, d = 4, center = true);
  }
}

// --- part 11 ---
module nut_washer() {
  difference() {
      translate([0, 0, 0]) cylinder(h = 1.6, d = 20);
      translate([0, 0, -1]) cylinder(h = 3.6, d = 10.8);
    }
}

// --- part 12 ---
module press_nut() {
  difference() {
    linear_extrude(height = 9) polygon(points = [[9.238, 0], [4.619, 8], [-4.619, 8], [-9.238, 0], [-4.619, -8], [4.619, -8]]);
    translate([0, 0, -1]) cylinder(h = 11, d = 10.8);
  }
}

// --- assembly ---
module assembly() {
  color([0.80, 0.24, 0.20]) translate([0, 0, 0]) rotate([0, 0, 0]) press_bed();
  color([0.20, 0.45, 0.75]) translate([0, 0, 10.25]) rotate([0, 0, 0]) anvil_block();
  color([0.25, 0.62, 0.32]) translate([46, 31, 10.25]) rotate([0, 0, 0]) press_post_a();
  color([0.92, 0.70, 0.18]) translate([46, -31, 10.25]) rotate([0, 0, 0]) press_post_b();
  color([0.58, 0.35, 0.70]) translate([-46, 31, 10.25]) rotate([0, 0, 0]) press_post_c();
  color([0.16, 0.66, 0.66]) translate([-46, -31, 10.25]) rotate([0, 0, 0]) press_post_d();
  color([0.85, 0.48, 0.18]) translate([0, 0, 70.5]) rotate([0, 0, 0]) press_frame();
  color([0.55, 0.60, 0.65]) translate([0, 0, 80.75]) rotate([0, 0, 0]) guide_ring();
  color([0.75, 0.30, 0.55]) translate([0, 0, 78.05]) rotate([0, 0, 0]) press_screw();
  color([0.42, 0.52, 0.28]) translate([0, 0, 48.25]) rotate([0, 0, 0]) press_head();
  color([0.80, 0.24, 0.20]) translate([0, 0, 97]) rotate([0, 0, 0]) nut_washer();
  color([0.20, 0.45, 0.75]) translate([0, 0, 98.85]) rotate([0, 0, 0]) press_nut();
}

assembly();
